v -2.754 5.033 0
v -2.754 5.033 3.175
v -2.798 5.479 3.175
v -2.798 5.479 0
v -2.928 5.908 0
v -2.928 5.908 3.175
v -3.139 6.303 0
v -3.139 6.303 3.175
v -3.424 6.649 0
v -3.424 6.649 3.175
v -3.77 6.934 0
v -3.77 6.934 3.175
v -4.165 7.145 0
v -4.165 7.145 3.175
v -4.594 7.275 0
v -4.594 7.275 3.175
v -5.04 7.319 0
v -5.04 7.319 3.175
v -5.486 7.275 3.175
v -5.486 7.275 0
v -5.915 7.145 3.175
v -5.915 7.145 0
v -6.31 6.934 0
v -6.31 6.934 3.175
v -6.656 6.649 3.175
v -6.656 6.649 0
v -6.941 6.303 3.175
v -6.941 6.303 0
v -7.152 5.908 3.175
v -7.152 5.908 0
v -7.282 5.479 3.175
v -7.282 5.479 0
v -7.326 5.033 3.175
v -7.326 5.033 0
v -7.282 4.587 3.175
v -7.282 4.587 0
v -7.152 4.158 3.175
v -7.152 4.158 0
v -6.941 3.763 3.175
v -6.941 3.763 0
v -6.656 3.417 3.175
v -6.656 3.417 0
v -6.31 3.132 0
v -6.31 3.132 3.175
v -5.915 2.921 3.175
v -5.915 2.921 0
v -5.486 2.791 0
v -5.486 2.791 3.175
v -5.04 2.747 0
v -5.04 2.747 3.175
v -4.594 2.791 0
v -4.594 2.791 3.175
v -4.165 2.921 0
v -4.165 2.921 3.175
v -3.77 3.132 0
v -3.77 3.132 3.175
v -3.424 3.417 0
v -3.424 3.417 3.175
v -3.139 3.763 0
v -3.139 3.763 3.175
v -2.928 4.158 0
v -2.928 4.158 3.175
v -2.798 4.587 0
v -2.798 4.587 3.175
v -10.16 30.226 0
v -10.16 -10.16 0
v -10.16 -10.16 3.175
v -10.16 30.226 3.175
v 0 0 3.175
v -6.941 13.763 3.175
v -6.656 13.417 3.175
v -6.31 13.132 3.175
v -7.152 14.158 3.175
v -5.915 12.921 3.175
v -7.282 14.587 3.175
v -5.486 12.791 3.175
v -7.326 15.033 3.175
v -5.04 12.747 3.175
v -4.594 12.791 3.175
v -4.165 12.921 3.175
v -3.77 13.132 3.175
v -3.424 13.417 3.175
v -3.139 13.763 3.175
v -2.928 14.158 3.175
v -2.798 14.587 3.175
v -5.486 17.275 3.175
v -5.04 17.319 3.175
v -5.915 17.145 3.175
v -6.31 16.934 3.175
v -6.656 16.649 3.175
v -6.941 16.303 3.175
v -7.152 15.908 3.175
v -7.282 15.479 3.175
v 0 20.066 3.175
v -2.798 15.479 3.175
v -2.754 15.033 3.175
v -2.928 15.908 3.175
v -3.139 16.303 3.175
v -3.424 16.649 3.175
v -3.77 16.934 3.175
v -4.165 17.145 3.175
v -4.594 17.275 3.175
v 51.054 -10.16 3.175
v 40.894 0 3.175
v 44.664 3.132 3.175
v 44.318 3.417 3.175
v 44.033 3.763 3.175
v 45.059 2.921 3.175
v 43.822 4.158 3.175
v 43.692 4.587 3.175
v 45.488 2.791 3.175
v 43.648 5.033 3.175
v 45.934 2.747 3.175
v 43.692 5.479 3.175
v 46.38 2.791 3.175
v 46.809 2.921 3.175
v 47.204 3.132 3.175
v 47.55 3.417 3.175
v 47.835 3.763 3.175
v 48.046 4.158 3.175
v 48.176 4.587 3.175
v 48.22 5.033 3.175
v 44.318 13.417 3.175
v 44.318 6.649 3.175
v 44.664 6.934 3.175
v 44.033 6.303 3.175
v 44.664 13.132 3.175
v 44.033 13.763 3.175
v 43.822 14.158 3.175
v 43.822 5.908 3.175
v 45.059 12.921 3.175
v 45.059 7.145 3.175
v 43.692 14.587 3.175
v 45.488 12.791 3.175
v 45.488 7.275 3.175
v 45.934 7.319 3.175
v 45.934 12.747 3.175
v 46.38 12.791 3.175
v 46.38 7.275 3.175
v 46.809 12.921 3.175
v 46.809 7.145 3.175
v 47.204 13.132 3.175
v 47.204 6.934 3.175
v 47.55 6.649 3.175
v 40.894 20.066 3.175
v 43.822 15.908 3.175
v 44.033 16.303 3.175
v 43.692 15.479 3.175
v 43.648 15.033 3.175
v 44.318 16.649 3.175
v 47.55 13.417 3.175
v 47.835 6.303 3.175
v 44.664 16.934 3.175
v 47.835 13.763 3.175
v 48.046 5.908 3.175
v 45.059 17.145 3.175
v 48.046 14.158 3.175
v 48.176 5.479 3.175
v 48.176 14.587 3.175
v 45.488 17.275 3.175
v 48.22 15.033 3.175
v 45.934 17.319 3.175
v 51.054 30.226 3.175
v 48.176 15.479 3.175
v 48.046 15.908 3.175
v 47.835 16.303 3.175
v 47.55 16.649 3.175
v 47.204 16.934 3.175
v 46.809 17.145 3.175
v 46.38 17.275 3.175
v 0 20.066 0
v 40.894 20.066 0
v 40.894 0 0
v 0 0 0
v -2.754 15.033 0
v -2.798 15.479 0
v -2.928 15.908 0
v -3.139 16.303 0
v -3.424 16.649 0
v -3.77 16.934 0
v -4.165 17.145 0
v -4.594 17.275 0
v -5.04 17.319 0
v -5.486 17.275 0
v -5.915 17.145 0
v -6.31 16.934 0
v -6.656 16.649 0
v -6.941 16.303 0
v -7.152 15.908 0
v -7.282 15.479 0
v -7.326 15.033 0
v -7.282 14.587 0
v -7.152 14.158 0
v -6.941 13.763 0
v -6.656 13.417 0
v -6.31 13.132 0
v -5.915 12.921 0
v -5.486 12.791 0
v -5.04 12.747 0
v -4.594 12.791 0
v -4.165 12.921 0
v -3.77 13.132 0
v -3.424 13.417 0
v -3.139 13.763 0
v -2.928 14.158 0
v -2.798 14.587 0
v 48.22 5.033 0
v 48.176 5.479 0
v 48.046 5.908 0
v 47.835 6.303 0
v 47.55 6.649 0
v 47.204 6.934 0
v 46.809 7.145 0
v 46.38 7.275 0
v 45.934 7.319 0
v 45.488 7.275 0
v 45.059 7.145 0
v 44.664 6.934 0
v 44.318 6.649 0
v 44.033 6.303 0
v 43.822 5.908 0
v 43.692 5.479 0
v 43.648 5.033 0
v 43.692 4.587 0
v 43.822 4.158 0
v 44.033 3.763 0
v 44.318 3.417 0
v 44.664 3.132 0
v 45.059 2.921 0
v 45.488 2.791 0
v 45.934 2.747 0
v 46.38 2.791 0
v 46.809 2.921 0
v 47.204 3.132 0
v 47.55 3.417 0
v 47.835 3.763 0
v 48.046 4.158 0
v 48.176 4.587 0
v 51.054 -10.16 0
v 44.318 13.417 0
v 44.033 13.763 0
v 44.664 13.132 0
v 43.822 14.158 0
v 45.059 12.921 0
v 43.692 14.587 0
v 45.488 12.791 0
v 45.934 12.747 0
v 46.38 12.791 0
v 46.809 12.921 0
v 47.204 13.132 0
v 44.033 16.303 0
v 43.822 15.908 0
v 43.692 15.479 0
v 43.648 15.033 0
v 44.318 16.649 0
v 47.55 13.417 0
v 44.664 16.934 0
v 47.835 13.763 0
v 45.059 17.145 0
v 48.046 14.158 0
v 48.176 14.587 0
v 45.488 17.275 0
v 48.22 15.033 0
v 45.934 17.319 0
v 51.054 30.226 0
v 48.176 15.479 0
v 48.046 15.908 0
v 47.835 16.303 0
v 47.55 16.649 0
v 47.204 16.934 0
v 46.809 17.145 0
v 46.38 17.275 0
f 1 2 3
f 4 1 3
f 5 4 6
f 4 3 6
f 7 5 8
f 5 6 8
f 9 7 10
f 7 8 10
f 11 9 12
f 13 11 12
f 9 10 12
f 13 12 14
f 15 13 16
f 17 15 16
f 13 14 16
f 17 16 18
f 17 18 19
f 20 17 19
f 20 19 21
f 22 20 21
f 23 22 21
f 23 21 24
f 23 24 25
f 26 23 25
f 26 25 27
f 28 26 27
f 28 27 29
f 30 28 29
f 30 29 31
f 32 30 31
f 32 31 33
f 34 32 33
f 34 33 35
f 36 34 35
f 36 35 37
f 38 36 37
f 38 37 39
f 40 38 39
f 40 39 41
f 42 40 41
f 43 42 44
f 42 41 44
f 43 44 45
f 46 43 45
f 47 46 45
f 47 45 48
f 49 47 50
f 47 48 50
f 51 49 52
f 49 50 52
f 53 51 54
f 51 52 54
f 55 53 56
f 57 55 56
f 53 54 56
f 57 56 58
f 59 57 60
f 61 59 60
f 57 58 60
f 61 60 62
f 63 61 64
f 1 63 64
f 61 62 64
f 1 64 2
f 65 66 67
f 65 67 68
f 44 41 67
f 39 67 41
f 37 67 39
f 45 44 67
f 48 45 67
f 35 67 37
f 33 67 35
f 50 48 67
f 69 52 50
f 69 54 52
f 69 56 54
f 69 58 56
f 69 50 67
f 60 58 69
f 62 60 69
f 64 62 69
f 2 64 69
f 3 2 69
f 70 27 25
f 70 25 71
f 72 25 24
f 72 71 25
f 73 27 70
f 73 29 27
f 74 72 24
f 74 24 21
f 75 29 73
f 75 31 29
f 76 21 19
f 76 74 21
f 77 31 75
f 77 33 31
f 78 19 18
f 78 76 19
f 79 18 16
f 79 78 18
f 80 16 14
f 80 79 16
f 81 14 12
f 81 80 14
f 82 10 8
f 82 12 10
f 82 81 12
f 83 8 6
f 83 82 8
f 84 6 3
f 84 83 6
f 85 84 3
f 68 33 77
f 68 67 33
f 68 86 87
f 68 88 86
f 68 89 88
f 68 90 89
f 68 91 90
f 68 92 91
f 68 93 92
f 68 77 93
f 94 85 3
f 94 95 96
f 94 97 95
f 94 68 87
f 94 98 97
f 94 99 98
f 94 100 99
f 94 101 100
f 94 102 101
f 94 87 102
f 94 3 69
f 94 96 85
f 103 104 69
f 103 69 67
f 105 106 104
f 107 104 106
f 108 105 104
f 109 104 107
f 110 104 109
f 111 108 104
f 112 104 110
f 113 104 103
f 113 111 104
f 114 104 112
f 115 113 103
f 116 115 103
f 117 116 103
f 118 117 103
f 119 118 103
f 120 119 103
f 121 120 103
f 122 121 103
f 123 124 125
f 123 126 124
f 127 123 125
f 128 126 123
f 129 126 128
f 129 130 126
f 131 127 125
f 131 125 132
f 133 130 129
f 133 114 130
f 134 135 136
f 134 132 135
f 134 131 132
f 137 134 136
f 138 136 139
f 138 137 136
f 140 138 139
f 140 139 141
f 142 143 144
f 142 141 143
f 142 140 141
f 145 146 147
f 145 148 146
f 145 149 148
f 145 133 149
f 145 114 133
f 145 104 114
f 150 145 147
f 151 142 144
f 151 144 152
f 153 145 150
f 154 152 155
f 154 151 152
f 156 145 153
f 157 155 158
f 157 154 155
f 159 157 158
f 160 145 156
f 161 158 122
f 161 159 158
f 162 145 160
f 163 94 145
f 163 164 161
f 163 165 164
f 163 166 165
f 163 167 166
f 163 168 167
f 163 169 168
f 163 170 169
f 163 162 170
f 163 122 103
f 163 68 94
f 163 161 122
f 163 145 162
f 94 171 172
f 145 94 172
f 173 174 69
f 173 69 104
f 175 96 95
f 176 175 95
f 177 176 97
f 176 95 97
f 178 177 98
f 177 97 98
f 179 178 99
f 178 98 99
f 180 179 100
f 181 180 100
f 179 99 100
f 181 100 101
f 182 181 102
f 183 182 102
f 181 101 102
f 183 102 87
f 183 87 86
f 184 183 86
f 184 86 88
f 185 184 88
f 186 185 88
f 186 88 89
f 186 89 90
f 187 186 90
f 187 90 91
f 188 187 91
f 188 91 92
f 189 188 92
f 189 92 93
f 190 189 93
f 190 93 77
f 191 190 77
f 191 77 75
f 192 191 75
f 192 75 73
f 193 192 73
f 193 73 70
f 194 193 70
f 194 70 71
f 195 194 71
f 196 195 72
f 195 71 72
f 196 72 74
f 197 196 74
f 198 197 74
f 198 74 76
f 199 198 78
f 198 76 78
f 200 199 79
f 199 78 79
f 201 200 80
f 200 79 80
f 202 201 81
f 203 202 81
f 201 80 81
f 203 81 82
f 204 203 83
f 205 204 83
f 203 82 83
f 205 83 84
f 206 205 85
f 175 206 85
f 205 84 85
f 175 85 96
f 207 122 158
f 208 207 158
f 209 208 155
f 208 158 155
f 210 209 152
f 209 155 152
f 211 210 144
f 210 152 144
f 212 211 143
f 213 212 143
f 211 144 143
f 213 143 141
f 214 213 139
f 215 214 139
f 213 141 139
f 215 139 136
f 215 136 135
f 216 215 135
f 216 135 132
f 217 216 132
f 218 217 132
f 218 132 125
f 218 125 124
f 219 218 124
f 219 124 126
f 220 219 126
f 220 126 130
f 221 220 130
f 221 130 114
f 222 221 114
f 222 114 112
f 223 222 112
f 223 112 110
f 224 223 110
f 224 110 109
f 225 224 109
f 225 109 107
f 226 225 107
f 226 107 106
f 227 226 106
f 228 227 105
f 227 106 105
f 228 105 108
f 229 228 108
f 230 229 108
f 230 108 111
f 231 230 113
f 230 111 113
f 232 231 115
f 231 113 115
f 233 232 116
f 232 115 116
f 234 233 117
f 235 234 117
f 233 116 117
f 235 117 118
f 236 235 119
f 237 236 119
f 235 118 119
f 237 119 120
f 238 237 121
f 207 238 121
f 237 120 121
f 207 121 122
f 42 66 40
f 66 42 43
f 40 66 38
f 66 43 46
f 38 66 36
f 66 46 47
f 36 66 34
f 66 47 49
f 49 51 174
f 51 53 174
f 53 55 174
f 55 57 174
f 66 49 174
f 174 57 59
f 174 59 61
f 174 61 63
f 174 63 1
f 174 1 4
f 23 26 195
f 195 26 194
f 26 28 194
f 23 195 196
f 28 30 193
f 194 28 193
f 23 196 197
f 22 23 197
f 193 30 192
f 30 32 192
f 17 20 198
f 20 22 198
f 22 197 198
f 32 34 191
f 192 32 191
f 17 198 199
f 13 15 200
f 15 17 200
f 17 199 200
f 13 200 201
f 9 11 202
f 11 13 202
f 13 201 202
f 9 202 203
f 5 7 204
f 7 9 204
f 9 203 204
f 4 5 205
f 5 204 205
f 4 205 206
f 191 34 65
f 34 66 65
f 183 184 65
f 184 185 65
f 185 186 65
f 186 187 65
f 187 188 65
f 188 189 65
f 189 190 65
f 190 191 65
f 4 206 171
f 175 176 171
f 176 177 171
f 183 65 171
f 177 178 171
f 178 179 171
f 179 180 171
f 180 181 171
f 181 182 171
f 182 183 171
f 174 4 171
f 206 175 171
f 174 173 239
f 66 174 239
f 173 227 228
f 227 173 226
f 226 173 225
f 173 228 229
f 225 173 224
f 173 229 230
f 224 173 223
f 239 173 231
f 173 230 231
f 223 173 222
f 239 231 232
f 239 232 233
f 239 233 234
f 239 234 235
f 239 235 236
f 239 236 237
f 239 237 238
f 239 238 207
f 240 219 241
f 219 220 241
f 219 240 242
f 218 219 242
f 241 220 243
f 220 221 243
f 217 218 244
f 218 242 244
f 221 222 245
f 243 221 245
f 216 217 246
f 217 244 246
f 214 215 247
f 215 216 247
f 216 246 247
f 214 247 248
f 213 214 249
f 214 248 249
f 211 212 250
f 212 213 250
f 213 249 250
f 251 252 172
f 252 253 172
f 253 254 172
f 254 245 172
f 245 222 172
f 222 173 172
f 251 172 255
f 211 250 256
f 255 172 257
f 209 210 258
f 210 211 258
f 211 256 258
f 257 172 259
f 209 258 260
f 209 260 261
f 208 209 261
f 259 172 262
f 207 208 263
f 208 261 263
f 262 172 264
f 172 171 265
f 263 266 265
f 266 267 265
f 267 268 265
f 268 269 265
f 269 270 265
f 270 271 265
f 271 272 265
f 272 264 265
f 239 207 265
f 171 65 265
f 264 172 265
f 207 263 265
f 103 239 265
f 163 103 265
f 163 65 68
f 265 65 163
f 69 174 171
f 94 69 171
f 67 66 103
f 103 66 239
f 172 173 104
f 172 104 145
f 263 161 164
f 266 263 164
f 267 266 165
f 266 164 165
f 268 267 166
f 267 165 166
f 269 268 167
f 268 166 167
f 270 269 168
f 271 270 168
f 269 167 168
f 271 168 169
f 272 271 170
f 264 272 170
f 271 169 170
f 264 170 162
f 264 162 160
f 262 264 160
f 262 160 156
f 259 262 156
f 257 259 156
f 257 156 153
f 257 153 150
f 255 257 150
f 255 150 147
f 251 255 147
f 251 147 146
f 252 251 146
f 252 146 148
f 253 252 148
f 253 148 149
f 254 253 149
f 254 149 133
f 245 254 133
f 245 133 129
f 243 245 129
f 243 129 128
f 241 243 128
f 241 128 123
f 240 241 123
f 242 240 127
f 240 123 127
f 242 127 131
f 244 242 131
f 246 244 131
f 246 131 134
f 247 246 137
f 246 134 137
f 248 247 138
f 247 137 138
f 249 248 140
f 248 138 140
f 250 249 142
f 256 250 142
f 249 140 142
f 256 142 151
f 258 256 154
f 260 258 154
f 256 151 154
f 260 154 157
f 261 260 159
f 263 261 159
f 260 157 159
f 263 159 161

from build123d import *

# Parameters (mm, degrees)
SKETCH1_W           = 61.214
SKETCH1_H           = 40.386
SKETCH1_W_2         = 40.894
SKETCH1_H_2         = 20.066
BOSS_EXTRUDE1_DEPTH = 3.175
SKETCH2_R           = 2.286
CUT_EXTRUDE1_DEPTH  = 4.175


with BuildPart() as part:
    # Sketch1 → Boss-Extrude1 (new body)
    with BuildSketch(Plane.XY):
        with Locations((20.447, 10.033)):
            Rectangle(SKETCH1_W, SKETCH1_H)
        with Locations((20.447, 10.033)):
            Rectangle(SKETCH1_W_2, SKETCH1_H_2, mode=Mode.SUBTRACT)
    extrude(amount=BOSS_EXTRUDE1_DEPTH)

    # Sketch2 → Cut-Extrude1 (cut, through all)
    with BuildSketch(Plane.XY.offset(3.175)):
        with Locations((-5.04, 15.033)):
            Circle(SKETCH2_R)
        with Locations((-5.04, 5.033)):
            Circle(SKETCH2_R)
        with Locations((45.934, 5.033)):
            Circle(SKETCH2_R)
        with Locations((45.934, 15.033)):
            Circle(SKETCH2_R)
    extrude(amount=-CUT_EXTRUDE1_DEPTH, mode=Mode.SUBTRACT)


solid = part.part
